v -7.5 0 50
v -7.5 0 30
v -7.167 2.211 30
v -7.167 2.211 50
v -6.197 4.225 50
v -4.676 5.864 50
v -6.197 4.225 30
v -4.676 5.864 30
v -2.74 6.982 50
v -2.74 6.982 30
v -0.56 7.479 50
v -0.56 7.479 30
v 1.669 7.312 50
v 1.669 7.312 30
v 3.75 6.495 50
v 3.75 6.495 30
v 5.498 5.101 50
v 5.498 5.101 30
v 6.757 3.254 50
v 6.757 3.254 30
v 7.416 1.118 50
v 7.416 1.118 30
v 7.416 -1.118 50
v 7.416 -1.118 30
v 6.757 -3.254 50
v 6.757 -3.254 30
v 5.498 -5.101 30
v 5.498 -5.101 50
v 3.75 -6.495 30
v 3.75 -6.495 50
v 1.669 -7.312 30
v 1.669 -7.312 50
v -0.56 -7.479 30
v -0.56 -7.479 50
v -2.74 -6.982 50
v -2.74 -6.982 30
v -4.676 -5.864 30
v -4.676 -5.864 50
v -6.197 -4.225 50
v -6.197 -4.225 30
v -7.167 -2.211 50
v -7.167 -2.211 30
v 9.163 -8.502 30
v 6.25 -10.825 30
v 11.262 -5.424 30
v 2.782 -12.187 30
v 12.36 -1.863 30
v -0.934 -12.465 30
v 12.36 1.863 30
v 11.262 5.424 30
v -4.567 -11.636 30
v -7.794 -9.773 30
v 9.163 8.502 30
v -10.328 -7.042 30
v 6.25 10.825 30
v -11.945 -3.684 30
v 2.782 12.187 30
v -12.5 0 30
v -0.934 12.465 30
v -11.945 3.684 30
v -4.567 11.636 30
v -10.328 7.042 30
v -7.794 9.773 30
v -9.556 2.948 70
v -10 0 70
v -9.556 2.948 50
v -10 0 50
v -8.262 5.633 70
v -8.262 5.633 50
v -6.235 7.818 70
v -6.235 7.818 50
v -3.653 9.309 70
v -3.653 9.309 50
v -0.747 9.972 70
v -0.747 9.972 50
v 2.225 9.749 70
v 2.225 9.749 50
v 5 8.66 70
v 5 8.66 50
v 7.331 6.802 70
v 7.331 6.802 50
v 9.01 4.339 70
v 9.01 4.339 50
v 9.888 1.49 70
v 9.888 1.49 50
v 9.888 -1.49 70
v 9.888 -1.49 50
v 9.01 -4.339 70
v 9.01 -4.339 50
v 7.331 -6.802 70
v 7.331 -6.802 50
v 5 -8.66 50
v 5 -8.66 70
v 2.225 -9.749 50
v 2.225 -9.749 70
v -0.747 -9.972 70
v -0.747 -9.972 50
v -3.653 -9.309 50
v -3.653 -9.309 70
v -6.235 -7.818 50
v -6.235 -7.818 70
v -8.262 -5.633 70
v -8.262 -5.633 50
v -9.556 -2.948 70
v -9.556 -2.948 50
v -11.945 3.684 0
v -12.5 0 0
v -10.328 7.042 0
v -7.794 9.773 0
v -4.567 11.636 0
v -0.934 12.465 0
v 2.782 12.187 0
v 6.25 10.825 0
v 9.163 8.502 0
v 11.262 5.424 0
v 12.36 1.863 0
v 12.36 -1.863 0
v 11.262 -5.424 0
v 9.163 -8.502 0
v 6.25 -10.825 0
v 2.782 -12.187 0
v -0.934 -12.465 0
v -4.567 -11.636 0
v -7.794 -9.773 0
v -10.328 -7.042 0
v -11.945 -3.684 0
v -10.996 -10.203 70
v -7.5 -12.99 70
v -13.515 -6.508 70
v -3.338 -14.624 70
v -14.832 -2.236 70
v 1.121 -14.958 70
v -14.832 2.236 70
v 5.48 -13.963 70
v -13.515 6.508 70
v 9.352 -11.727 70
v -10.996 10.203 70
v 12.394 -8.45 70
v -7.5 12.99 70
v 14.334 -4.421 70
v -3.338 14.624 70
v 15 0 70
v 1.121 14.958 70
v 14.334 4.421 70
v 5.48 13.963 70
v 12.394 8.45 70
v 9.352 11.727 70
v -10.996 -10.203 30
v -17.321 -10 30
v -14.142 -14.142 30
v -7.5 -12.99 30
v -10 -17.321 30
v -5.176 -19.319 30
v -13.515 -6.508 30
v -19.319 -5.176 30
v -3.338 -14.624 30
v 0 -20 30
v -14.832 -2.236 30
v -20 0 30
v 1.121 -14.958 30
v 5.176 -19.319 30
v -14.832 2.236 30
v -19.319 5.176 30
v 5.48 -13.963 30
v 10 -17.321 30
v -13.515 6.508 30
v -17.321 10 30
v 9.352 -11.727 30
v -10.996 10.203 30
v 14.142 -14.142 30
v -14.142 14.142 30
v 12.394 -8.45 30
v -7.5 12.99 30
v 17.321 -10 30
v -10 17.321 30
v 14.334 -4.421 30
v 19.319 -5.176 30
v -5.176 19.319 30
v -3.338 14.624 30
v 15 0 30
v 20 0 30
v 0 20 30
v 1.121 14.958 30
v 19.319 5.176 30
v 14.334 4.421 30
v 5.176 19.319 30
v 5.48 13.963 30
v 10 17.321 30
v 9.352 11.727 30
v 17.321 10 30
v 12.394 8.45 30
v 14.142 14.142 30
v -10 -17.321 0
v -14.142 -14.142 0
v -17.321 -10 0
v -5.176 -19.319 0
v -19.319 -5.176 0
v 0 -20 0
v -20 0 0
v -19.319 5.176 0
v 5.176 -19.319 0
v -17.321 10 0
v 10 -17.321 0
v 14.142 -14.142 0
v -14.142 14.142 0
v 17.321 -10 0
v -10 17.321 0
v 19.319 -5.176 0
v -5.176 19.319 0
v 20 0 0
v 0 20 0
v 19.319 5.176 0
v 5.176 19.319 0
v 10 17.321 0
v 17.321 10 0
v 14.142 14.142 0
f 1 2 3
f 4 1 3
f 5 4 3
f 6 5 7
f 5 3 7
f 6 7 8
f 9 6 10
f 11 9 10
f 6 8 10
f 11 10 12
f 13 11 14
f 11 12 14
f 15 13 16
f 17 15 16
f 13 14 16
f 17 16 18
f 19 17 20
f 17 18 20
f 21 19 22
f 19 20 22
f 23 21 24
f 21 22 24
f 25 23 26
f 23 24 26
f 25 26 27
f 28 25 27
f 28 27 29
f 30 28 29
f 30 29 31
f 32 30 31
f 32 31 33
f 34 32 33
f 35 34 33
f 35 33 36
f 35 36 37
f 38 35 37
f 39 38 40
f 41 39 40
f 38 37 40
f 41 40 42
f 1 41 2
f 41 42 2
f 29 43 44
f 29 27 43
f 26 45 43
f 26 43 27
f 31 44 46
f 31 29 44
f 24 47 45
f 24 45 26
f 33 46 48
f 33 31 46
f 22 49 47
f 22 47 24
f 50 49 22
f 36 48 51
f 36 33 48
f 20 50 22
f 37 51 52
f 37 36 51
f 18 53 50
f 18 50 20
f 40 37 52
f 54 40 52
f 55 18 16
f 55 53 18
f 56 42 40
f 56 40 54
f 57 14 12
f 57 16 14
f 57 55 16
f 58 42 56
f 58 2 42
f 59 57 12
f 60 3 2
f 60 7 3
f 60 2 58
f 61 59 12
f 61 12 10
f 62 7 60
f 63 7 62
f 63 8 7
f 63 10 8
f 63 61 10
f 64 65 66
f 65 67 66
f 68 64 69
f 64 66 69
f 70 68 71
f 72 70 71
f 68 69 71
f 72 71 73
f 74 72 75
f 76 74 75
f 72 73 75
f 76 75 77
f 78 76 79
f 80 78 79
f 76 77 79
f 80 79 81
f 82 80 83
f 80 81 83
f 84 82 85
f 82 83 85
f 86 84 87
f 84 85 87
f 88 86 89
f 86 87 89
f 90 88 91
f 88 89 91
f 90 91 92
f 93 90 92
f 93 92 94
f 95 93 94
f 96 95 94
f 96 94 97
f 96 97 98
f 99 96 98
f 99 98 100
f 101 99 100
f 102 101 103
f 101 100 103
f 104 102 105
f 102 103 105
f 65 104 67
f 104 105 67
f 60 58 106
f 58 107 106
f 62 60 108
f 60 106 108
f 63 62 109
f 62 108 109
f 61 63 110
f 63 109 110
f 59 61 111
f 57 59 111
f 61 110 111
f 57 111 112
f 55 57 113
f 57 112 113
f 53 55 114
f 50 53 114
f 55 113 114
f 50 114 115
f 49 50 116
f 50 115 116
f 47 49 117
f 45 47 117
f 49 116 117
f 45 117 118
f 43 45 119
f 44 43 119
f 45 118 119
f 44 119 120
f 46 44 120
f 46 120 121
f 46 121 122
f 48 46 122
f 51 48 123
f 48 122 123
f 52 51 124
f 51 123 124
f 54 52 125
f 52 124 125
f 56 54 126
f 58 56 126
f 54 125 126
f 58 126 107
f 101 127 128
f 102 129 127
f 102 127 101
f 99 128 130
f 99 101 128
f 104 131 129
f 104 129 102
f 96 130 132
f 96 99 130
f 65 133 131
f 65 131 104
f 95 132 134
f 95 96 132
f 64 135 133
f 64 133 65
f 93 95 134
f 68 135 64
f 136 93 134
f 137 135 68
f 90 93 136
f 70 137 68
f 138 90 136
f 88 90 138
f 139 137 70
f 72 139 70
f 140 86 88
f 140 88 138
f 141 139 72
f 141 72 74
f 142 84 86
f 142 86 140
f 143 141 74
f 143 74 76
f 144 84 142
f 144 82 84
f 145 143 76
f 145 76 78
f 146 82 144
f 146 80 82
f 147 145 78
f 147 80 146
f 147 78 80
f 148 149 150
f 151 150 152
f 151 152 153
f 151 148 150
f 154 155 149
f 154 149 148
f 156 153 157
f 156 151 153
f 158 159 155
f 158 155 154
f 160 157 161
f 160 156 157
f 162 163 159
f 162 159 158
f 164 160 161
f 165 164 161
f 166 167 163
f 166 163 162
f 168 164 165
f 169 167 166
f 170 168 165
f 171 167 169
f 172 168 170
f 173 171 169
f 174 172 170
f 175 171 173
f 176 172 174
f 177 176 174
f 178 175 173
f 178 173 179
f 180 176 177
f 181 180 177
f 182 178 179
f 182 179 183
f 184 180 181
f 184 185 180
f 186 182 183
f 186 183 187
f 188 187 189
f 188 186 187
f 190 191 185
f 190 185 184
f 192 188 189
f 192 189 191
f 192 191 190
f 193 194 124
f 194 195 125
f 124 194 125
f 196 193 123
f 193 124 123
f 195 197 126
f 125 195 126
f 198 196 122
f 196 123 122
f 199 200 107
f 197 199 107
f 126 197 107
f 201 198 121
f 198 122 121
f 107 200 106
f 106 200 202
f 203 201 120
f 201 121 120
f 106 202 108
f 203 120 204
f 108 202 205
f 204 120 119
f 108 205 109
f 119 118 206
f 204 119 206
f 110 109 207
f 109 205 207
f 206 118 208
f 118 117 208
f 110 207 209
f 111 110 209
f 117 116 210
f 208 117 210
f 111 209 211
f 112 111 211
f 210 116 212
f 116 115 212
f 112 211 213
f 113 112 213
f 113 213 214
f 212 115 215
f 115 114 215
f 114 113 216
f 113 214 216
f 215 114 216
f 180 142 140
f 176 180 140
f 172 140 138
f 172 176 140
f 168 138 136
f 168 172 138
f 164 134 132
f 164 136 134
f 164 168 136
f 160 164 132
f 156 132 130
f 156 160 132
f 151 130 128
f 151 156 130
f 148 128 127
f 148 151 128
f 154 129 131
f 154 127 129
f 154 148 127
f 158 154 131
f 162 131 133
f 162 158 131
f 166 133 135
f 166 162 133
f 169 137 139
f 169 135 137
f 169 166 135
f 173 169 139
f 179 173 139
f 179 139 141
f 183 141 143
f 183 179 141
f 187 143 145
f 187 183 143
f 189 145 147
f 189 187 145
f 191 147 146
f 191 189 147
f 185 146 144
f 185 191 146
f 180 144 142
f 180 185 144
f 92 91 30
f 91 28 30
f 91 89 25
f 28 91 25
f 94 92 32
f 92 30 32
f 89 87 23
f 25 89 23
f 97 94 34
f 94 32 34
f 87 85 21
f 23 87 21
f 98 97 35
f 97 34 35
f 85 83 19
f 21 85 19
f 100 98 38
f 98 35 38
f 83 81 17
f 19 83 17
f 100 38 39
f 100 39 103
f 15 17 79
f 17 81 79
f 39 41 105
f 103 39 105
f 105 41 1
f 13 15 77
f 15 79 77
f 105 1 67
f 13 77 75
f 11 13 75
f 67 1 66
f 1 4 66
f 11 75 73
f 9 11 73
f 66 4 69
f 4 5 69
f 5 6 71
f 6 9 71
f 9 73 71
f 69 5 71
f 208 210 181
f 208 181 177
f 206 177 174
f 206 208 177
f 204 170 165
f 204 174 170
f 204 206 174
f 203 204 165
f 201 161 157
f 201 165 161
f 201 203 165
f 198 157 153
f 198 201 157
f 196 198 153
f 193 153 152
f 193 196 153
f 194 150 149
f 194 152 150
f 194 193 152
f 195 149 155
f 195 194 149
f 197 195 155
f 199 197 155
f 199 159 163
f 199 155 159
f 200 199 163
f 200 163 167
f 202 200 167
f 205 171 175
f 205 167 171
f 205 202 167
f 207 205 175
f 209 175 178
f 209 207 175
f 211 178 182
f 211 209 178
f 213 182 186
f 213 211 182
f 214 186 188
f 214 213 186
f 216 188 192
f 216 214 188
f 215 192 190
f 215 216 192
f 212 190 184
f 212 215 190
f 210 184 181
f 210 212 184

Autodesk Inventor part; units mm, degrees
ref_plane "YZ Plane" through (0, 0, 0) normal (1, 0, 0) x (0, 1, 0)
ref_plane "XZ Plane" through (0, 0, 0) normal (0, 1, 0) x (-1, 0, 0)
ref_plane "XY Plane" through (0, 0, 0) normal (0, 0, 1) x (1, 0, 0)
sketch "스케치1" plane through (0, 0, 0) normal (0, 0, 1) x (1, 0, 0)
  circle A0 centre (0, 0) radius 20
  dimension "d0" = 40
extrude "돌출1" add sketch "스케치1" along normal blind 30
sketch "스케치2" plane through (0, 0, 30) normal (0, 0, 1) x (1, 0, 0)
  circle A0 centre (0, 0) radius 15
  dimension "d3" = 30
extrude "돌출2" add sketch "스케치2" along normal blind 40
sketch "스케치3" plane through (0, 0, 0) normal (0, 0, -1) x (-1, 0, 0)
  circle A0 centre (0, 0) radius 12.5
  dimension "d6" = 25
extrude "돌출3" cut sketch "스케치3" against normal blind 30
sketch "스케치4" plane through (0, 0, 30) normal (0, 0, -1) x (-1, 0, 0)
  circle A0 centre (0, 0) radius 7.5
  dimension "d9" = 15
extrude "돌출4" cut sketch "스케치4" against normal blind 20
sketch "스케치5" plane through (0, 0, 50) normal (0, 0, -1) x (-1, 0, 0)
  circle A0 centre (0, 0) radius 10
  dimension "d12" = 20
extrude "돌출5" cut sketch "스케치5" against normal up to next
properties part number "기본 투상 연습2"
